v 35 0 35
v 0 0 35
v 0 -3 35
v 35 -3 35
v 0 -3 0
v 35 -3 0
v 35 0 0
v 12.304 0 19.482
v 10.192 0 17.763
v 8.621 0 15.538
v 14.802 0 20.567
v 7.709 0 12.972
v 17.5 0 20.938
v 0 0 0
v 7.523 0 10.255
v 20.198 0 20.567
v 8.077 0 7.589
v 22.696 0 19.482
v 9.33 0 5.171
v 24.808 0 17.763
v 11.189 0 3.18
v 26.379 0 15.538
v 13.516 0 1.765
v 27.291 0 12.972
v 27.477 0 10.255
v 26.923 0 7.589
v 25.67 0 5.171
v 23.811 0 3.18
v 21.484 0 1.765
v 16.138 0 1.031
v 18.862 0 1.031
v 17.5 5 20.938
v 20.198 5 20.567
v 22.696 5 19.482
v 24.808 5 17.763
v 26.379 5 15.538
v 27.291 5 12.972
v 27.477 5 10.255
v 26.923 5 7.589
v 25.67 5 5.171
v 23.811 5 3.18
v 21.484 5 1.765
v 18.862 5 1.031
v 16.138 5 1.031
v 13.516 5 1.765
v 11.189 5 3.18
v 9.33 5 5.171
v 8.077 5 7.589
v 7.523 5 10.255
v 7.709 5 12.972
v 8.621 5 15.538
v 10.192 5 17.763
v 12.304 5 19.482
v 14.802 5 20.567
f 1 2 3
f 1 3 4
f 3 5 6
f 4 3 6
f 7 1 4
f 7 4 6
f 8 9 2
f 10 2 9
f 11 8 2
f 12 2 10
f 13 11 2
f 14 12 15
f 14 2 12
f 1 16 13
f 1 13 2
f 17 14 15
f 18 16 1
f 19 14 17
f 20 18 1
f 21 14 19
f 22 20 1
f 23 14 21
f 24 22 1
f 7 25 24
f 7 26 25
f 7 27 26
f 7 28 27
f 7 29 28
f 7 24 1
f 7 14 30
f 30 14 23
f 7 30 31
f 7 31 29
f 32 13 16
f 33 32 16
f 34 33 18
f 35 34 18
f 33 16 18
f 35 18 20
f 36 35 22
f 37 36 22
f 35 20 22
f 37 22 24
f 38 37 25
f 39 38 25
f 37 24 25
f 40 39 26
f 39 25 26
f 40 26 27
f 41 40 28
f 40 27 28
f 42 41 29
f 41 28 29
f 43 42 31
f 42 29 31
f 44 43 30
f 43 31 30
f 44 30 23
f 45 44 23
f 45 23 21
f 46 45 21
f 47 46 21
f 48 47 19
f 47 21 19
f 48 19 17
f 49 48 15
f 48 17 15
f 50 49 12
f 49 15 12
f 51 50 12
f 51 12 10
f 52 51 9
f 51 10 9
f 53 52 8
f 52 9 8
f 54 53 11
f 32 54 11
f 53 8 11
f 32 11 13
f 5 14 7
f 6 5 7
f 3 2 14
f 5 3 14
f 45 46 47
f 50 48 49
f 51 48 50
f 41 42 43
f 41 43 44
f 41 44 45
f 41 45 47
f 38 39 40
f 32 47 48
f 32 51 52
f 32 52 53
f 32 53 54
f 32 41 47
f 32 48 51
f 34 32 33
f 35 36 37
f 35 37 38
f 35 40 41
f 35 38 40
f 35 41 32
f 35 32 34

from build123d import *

# Parameters (mm, degrees)
SKETCH1_W           = 35
SKETCH1_H           = 35
BOSS_EXTRUDE1_DEPTH = 3
SKETCH2_R           = 10
BOSS_EXTRUDE2_DEPTH = 5


with BuildPart() as part:
    # Sketch1 → Boss-Extrude1 (new body)
    with BuildSketch(Plane(origin=(0, 0, 0), x_dir=(1, 0, 0), z_dir=(0, 1, 0))):
        with Locations((17.5, -17.5)):
            Rectangle(SKETCH1_W, SKETCH1_H)
    extrude(amount=-BOSS_EXTRUDE1_DEPTH)

    # Sketch2 → Boss-Extrude2 (add)
    with BuildSketch(Plane(origin=(0, 0, 0), x_dir=(1, 0, 0), z_dir=(0, 1, 0))):
        with Locations(Location((17.5, -10.9375, 0), (0, 0, 270))):
            Circle(SKETCH2_R)
    extrude(amount=BOSS_EXTRUDE2_DEPTH)


solid = part.part
